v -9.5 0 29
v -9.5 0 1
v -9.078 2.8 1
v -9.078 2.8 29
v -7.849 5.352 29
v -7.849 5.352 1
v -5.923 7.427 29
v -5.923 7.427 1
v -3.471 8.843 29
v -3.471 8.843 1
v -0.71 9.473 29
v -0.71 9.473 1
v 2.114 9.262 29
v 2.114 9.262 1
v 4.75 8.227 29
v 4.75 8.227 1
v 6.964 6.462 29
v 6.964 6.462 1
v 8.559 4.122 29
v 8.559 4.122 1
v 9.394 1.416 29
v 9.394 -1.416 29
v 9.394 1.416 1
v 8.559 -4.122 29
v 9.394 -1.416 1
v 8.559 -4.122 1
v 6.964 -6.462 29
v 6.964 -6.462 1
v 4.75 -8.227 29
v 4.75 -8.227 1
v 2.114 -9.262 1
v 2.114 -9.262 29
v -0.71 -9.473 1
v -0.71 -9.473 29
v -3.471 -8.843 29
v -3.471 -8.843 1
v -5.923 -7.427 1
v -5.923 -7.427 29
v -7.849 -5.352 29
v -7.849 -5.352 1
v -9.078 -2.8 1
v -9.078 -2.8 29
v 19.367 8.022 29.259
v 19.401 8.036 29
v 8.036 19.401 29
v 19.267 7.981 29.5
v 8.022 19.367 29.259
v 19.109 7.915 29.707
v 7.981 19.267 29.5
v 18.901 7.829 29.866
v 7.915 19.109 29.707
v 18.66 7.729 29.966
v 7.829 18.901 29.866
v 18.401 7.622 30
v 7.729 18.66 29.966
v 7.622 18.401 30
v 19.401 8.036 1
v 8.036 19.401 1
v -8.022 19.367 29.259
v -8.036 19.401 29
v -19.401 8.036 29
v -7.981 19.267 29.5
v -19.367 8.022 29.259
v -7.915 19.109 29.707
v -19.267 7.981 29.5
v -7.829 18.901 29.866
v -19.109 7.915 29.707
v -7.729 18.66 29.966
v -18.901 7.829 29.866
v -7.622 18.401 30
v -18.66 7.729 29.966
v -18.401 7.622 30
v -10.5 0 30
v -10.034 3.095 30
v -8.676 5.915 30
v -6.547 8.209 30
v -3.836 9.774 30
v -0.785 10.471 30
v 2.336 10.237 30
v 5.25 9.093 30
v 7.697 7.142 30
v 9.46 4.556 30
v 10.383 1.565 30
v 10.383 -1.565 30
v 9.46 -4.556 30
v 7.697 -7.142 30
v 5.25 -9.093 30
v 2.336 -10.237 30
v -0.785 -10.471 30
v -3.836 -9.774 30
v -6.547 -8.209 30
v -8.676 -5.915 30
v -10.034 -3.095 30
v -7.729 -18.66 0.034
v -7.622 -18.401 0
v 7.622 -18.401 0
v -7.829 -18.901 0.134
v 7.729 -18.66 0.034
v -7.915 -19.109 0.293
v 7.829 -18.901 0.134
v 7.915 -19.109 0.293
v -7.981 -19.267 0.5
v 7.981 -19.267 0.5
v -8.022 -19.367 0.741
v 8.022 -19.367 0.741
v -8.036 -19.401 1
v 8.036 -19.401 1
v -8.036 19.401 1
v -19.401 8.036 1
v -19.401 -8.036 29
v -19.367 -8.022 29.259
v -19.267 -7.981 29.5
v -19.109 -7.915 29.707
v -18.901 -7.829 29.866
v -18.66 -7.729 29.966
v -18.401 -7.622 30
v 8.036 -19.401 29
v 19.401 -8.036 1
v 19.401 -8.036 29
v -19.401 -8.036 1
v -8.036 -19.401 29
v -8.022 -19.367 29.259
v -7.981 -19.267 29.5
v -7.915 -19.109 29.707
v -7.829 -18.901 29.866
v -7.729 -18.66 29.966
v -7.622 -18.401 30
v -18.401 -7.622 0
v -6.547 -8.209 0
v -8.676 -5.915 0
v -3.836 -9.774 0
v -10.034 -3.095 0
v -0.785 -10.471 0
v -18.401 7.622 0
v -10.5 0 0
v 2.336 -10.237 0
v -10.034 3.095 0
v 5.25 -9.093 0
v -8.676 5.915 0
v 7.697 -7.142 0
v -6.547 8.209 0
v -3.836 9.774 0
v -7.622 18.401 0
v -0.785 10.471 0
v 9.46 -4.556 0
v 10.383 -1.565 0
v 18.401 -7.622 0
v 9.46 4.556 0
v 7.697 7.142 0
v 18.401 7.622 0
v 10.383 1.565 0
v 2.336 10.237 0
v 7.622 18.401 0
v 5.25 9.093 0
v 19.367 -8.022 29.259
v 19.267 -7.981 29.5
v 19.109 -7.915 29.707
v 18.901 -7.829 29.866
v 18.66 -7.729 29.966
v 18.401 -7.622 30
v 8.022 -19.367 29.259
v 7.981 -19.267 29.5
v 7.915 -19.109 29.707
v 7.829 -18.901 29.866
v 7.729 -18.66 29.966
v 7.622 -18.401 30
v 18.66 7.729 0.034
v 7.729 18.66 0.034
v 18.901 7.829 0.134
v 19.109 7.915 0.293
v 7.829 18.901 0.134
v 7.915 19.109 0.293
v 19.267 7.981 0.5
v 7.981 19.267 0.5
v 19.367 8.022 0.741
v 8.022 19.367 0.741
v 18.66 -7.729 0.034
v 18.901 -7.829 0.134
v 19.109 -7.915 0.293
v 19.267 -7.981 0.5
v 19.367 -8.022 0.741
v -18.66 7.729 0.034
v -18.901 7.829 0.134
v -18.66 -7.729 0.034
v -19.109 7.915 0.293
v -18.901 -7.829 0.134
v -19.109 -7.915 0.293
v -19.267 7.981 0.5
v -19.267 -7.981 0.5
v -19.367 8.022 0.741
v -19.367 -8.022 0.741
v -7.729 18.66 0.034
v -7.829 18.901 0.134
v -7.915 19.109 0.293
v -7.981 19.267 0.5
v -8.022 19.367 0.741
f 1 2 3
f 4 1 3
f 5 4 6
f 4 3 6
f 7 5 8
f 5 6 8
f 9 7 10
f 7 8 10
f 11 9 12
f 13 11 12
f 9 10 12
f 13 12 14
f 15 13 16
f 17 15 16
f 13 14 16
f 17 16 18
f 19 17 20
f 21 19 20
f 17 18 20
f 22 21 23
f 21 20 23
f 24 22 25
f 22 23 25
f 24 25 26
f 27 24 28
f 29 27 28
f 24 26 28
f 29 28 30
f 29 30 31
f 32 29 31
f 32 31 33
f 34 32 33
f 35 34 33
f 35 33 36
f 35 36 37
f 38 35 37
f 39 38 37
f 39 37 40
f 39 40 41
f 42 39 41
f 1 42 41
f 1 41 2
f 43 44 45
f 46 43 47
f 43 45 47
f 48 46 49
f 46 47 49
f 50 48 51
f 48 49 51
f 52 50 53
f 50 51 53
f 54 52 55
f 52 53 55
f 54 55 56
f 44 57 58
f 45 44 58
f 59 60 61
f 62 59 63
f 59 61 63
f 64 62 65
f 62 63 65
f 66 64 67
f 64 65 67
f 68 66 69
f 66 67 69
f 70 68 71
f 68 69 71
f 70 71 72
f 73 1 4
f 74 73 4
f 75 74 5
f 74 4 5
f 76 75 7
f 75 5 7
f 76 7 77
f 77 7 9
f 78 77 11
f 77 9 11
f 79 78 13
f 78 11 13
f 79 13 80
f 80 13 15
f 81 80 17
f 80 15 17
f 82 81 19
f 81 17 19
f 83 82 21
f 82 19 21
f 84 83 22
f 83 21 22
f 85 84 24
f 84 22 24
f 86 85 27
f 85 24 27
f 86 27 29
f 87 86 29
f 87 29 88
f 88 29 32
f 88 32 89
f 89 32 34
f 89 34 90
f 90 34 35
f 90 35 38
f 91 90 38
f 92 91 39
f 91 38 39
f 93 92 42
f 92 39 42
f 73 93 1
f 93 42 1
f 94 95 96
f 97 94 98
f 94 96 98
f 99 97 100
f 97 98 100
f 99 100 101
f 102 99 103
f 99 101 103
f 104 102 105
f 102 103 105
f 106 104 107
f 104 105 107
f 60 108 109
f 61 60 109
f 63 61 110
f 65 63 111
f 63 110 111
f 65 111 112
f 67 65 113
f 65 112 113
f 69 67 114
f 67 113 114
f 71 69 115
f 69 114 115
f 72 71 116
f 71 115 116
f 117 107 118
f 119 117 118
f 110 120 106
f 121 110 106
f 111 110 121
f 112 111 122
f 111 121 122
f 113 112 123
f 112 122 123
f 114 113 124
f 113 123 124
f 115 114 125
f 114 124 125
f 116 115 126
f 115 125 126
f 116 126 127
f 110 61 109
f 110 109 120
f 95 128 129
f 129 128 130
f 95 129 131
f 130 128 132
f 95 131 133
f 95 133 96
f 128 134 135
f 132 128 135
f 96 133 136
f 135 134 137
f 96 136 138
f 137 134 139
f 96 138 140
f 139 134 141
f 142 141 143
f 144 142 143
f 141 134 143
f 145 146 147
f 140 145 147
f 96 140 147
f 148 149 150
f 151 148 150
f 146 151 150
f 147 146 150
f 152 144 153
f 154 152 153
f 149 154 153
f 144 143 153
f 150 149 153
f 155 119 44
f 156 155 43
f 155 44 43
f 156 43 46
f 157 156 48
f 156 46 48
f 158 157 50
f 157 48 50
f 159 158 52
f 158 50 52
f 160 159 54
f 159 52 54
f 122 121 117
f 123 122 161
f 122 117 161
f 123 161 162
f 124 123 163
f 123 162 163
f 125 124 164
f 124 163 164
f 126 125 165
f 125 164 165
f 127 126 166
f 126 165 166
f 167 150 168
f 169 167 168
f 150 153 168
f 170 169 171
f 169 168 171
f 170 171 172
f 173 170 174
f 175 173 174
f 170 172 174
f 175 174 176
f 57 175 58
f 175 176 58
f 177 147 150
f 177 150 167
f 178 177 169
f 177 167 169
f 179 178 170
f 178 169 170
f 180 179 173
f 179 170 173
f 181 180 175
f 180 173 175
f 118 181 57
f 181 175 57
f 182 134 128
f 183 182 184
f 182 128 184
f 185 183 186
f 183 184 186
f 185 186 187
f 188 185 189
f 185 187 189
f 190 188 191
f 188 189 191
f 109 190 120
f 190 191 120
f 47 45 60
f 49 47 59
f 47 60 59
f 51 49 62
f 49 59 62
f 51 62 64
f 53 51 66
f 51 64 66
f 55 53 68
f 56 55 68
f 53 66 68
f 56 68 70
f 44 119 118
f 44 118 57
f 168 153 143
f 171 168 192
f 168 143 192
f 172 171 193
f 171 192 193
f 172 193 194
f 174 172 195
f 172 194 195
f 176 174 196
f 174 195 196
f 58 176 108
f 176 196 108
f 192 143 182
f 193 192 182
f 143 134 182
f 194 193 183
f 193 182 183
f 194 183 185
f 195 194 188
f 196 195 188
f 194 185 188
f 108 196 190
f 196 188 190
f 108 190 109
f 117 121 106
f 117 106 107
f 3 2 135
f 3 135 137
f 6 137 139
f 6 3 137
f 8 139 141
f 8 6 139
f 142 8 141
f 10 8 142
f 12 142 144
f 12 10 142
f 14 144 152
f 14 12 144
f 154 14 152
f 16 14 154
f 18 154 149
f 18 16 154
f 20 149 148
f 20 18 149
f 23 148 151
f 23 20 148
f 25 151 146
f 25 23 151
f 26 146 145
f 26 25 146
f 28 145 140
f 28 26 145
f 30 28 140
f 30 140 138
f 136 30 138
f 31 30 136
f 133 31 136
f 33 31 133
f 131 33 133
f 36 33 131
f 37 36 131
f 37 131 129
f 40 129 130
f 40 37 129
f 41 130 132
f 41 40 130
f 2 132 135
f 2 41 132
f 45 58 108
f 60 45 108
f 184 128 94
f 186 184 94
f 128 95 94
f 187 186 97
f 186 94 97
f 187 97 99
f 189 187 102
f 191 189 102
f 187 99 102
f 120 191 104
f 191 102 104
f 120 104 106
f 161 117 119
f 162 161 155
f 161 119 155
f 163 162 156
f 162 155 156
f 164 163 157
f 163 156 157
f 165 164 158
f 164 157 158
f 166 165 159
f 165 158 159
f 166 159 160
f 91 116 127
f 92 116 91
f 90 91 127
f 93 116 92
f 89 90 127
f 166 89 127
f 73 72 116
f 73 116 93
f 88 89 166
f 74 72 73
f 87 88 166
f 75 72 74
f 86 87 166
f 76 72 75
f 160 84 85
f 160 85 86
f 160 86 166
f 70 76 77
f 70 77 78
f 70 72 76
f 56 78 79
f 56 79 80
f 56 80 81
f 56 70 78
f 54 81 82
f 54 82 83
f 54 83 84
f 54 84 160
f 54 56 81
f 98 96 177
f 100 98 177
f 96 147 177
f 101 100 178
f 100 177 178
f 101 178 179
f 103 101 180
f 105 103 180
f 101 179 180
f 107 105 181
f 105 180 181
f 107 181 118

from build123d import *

# Parameters (mm, degrees)
ESTRUSIONE_ESTRUSIONE1_DEPTH = 30
SCHIZZO2_R                   = 9.5
TAGLIO_ESTRUSIONE1_DEPTH     = 41.655062299
SMUSSO1_SIZE                 = 1
RACCORDO1_R                  = 1


with BuildPart() as part:
    # Schizzo1 → Estrusione-Estrusione1 (new body)
    with BuildSketch(Plane.XY):
        Polygon((8.03635208, 19.401470183), (-8.03635208, 19.401470183), (-19.401470183, 8.03635208), (-19.401470183, -8.03635208), (-8.03635208, -19.401470183), (8.03635208, -19.401470183), (19.401470183, -8.03635208), (19.401470183, 8.03635208), align=None)
    extrude(amount=ESTRUSIONE_ESTRUSIONE1_DEPTH)

    # Schizzo2 → Taglio-Estrusione1 (cut, through all)
    with BuildSketch(Plane(origin=(0, 0, 0), x_dir=(-1, 0, 0), z_dir=(0, 0, -1))):
        Circle(SCHIZZO2_R)
    extrude(amount=-TAGLIO_ESTRUSIONE1_DEPTH, mode=Mode.SUBTRACT)

    # Smusso1
    smusso1_edges = [part.edges().sort_by_distance(p)[0] for p in [
        (9.5, 0, 30),
        (9.5, 0, 0),
    ]]
    chamfer(smusso1_edges, length=SMUSSO1_SIZE)

    # Raccordo1
    raccordo1_edges = [part.edges().sort_by_distance(p)[0] for p in [
        (19.401470183, 0, 0),
        (13.718911131, -13.718911131, 0),
        (-13.718911131, 13.718911131, 30),
        (0, -19.401470183, 0),
        (-13.718911131, -13.718911131, 0),
        (-19.401470183, 0, 0),
        (-13.718911131, 13.718911131, 0),
        (0, 19.401470183, 0),
        (-19.401470183, 0, 30),
        (-13.718911131, -13.718911131, 30),
        (0, -19.401470183, 30),
        (13.718911131, -13.718911131, 30),
        (19.401470183, 0, 30),
        (13.718911131, 13.718911131, 30),
        (0, 19.401470183, 30),
        (13.718911131, 13.718911131, 0),
    ]]
    fillet(raccordo1_edges, radius=RACCORDO1_R)


solid = part.part
